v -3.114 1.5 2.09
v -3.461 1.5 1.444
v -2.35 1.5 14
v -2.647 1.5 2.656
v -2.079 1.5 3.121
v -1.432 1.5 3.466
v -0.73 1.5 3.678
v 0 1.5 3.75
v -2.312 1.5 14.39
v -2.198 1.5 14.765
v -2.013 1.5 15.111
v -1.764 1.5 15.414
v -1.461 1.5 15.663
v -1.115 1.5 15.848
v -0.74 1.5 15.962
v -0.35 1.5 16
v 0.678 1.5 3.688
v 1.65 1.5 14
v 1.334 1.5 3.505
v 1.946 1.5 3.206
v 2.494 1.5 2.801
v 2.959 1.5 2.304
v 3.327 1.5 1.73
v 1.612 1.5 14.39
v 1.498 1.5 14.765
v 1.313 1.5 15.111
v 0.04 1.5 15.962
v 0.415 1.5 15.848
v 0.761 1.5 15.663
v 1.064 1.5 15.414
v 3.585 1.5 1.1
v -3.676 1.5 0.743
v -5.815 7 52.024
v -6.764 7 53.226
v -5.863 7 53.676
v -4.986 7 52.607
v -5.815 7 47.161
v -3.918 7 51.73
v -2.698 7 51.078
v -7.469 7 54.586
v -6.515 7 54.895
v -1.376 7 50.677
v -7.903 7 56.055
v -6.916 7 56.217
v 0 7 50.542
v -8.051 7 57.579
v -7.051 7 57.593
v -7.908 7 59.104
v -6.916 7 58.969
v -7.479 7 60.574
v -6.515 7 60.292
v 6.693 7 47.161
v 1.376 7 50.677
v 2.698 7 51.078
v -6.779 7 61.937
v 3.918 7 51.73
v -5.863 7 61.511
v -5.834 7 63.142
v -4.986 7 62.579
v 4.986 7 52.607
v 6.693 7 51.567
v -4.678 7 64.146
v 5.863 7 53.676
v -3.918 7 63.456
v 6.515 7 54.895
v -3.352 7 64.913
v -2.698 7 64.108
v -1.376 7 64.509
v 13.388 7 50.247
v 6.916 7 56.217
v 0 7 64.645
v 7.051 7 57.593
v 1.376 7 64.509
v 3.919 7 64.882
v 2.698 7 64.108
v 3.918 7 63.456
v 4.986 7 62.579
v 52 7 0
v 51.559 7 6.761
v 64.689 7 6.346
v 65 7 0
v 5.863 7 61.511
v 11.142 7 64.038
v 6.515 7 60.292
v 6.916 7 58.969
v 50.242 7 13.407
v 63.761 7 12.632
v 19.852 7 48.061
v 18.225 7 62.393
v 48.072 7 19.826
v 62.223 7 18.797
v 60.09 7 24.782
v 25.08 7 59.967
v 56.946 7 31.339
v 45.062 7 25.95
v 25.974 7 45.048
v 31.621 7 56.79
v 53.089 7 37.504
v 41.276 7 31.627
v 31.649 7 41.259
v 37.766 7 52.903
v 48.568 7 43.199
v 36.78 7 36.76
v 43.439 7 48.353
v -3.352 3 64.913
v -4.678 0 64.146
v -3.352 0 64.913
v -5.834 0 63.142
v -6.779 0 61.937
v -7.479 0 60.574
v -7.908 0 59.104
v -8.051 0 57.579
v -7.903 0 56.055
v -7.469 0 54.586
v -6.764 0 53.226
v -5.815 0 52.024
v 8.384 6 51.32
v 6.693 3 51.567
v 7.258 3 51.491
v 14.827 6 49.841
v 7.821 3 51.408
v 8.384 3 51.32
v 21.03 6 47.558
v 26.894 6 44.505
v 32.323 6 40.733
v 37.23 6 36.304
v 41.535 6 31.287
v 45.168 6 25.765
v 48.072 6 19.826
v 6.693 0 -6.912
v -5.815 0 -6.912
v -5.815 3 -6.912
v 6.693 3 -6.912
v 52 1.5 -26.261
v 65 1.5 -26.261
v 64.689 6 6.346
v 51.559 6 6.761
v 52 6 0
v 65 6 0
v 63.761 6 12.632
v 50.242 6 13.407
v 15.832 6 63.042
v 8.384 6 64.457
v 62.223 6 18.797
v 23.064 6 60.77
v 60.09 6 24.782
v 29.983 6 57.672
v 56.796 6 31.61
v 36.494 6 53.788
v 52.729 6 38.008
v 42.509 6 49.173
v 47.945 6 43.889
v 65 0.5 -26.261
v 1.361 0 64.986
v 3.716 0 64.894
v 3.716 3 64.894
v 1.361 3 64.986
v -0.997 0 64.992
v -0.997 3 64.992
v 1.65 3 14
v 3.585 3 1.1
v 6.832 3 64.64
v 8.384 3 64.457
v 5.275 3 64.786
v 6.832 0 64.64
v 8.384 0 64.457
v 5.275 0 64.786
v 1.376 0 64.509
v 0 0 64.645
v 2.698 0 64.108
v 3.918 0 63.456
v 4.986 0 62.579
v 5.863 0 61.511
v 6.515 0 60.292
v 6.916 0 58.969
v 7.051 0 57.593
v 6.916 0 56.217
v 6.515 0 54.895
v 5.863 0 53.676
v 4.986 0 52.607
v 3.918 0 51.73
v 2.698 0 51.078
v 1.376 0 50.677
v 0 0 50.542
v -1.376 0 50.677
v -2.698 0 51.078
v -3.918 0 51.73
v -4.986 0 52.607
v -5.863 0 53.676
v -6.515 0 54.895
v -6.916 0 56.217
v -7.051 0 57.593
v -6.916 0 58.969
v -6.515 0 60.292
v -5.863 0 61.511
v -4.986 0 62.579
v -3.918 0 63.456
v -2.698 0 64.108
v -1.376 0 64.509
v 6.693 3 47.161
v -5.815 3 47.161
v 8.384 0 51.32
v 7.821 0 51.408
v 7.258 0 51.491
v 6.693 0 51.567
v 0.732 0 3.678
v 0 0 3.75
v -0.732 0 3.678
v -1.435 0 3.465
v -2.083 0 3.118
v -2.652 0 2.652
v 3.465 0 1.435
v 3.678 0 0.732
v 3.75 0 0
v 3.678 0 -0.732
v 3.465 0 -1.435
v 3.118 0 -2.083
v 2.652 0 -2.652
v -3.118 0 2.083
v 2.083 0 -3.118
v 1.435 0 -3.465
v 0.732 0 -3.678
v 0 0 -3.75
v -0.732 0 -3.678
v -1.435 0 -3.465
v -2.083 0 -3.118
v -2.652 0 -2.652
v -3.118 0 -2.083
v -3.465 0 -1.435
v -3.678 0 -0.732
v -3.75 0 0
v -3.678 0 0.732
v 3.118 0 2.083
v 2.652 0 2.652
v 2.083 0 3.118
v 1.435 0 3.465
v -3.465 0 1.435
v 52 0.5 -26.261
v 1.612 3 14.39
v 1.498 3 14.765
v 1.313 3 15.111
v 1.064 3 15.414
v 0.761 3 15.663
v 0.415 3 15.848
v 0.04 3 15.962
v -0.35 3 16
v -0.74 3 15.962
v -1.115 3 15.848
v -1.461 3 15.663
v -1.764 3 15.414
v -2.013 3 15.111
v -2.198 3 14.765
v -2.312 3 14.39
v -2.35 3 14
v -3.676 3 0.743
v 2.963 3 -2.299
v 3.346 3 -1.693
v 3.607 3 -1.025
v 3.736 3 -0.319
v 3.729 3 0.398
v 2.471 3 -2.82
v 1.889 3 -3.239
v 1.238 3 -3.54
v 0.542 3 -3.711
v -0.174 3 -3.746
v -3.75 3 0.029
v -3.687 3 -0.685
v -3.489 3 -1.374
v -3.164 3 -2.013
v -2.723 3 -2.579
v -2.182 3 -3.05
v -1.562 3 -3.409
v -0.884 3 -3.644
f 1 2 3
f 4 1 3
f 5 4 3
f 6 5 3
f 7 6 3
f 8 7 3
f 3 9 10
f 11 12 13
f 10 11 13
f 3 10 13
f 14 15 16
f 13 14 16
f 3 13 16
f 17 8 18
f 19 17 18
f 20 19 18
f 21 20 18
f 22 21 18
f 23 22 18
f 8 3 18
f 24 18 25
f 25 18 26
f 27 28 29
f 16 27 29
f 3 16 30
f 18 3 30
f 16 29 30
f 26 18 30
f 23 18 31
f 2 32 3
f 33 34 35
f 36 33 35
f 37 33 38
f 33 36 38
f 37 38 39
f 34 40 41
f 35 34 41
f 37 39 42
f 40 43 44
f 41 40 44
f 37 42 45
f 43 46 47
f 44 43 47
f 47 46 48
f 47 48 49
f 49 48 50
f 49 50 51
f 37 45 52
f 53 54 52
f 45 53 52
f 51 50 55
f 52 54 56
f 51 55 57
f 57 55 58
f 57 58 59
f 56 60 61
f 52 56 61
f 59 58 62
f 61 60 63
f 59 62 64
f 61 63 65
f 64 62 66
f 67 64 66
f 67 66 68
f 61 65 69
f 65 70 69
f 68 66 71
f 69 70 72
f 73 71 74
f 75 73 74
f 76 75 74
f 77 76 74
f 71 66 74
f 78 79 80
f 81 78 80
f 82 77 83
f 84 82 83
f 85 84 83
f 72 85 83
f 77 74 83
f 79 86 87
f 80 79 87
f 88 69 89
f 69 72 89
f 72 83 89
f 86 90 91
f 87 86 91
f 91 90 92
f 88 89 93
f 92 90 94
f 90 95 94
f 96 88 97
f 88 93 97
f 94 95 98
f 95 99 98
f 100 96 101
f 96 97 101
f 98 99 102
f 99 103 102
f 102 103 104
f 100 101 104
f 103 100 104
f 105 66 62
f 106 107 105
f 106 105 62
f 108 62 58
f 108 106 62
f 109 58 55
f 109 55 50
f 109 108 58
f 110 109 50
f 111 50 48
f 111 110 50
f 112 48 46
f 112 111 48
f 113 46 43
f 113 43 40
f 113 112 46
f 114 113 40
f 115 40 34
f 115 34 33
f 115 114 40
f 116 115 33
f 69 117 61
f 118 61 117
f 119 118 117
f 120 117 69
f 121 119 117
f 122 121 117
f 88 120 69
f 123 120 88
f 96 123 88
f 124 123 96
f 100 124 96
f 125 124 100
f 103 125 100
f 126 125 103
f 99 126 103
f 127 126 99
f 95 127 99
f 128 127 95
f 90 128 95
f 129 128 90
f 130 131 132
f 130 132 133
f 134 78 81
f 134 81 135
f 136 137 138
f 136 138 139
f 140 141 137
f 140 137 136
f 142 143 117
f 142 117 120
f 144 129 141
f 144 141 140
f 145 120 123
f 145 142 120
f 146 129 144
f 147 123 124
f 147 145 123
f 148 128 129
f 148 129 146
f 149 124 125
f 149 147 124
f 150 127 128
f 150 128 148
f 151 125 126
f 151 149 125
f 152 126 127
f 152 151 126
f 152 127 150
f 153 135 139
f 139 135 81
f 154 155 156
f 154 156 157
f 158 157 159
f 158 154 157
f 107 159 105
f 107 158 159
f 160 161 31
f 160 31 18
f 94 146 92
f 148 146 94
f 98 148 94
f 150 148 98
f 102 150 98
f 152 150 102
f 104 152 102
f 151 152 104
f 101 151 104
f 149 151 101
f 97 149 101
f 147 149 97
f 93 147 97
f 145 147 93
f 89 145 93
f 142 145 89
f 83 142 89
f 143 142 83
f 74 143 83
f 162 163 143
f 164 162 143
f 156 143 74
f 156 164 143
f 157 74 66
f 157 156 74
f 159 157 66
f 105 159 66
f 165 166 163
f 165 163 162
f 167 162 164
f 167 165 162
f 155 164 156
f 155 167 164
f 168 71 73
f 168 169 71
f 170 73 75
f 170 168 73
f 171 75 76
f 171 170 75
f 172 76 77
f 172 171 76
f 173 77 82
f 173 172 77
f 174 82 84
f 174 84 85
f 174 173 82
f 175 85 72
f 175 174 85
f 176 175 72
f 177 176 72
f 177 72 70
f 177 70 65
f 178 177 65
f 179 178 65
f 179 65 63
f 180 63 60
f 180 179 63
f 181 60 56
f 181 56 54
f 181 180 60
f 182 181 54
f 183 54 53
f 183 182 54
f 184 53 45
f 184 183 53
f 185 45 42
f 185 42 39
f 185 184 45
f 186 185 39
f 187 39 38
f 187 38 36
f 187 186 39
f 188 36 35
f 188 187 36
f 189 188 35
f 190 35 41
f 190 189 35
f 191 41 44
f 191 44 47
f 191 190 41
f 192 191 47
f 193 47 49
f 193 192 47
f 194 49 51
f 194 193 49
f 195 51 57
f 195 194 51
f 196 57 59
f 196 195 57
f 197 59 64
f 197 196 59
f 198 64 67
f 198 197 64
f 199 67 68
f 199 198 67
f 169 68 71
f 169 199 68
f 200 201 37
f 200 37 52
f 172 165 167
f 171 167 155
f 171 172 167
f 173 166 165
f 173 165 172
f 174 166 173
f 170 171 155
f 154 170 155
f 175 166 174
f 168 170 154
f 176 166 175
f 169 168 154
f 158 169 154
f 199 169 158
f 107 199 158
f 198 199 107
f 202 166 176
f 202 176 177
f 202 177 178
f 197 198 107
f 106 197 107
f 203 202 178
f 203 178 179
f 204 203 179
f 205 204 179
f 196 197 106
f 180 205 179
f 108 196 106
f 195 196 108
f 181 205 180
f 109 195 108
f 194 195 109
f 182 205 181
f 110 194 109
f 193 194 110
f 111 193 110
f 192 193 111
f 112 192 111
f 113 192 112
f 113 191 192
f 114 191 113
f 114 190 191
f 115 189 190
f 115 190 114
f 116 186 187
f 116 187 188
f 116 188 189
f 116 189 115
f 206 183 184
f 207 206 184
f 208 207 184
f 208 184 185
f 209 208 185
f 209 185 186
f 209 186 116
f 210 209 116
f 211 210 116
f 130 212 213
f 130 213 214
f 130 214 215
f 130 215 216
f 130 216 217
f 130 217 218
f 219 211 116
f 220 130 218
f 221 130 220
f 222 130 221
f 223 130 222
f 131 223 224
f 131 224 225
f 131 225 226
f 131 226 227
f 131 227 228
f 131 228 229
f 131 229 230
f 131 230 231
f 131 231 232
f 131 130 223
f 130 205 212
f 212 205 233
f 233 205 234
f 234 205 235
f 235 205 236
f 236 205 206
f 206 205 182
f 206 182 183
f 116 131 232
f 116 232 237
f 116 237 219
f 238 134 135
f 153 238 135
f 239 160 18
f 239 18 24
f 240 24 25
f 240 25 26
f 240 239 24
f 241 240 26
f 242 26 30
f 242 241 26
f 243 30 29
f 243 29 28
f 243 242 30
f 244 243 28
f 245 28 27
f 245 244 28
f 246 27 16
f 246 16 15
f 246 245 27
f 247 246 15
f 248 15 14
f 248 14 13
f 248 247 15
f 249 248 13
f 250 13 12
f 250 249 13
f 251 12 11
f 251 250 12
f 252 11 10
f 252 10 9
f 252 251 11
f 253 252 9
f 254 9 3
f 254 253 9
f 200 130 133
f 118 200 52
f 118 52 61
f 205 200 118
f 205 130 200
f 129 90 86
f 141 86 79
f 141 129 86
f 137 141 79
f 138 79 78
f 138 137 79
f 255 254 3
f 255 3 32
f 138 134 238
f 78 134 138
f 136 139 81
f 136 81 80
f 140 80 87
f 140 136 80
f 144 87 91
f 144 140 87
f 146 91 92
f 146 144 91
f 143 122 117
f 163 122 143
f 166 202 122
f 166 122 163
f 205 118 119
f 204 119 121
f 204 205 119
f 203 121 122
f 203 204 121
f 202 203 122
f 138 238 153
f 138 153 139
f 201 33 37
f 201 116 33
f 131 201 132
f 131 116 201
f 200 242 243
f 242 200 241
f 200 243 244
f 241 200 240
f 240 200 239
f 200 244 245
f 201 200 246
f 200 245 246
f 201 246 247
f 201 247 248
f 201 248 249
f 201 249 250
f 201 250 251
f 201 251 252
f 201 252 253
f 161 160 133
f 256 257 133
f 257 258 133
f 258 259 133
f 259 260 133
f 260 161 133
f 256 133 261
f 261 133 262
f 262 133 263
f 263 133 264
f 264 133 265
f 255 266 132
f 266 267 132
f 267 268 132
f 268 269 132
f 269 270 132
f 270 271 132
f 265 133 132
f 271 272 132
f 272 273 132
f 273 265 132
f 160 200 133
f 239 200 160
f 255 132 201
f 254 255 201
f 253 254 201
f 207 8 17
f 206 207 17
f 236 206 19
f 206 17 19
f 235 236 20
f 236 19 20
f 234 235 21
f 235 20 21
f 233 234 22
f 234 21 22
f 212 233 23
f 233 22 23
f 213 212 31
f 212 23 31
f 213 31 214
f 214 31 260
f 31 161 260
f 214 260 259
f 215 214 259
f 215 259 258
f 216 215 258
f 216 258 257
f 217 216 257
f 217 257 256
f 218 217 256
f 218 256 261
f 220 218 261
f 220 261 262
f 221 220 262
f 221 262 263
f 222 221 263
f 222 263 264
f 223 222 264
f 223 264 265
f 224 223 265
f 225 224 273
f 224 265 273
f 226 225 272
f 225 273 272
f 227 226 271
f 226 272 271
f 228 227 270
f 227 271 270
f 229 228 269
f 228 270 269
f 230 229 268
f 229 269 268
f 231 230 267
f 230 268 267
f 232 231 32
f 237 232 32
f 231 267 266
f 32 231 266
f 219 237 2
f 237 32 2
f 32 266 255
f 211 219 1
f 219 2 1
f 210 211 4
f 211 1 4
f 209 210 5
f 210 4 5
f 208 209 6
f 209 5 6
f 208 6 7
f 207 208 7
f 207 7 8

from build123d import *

# Parameters (mm, degrees)
SKETCH1_R                = 7.051488697
BOSS_EXTRUDE1_DEPTH      = 3
SKETCH2_R                = 7.051488697
BOSS_EXTRUDE2_DEPTH      = 4
SKETCH3_R                = 3.75
CUT_EXTRUDE1_DEPTH       = 93.010868923
CUT_EXTRUDE2_START       = -3
CUT_EXTRUDE2_DEPTH       = 1.5
SKETCH5_W                = 67.326740962
SKETCH5_H                = 77.001413362
CUT_EXTRUDE4_DEPTH       = 6
BOSS_EXTRUDE3_DEPTH      = 10
BOSS_EXTRUDE3_DEPTH_BACK = 1
SKETCH6_W                = 13
SKETCH6_H                = 26.261119779
CUT_EXTRUDE5_DEPTH       = 89.770385235


with BuildPart() as part:
    # Sketch1 → Boss-Extrude1 (new body)
    with BuildSketch(Plane(origin=(0, 0, 0), x_dir=(1, 0, 0), z_dir=(0, 1, 0))):
        with BuildLine():
            Line((6.693069307, -1.487522855), (6.693069307, -51.567458957))
            ThreePointArc((6.693069307, -51.567458957), (22.956358252, -46.658392769), (36.769552622, -36.769552622))
            ThreePointArc((36.769552622, -36.769552622), (43.25852742, -28.856538348), (48.072152744, -19.825945893))
            Line((48.072152744, -19.825945893), (60.09019093, -24.782432367))
            ThreePointArc((60.09019093, -24.782432367), (54.073159275, -36.070672935), (45.961940777, -45.961940777))
            ThreePointArc((45.961940777, -45.961940777), (26.581470301, -59.316316783), (3.715889133, -64.893698985))
            ThreePointArc((3.715889133, -64.893698985), (0.18200985, -64.999745172), (-3.352407903, -64.913491365))
            ThreePointArc((-3.352407903, -64.913491365), (-7.908445684, -59.104066137), (-5.814964059, -52.024218933))
            Line((-5.814964059, -52.024218933), (-5.814964059, -3.088434015))
            Line((-5.814964059, -3.088434015), (-5.814964059, 3.911565985))
            Line((-5.814964059, 3.911565985), (-5.814964059, 6.911565985))
            Line((-5.814964059, 6.911565985), (6.693069307, 6.911565985))
            Line((6.693069307, 6.911565985), (6.693069307, 3.911565985))
            Line((6.693069307, 3.911565985), (6.693069307, -1.487522855))
        make_face()
        with Locations(Location((0, -57.593120372, 0), (0, 0, 270))):
            Circle(SKETCH1_R, mode=Mode.SUBTRACT)
    extrude(amount=BOSS_EXTRUDE1_DEPTH)

    # Sketch2 → Boss-Extrude2 (add)
    with BuildSketch(Plane(origin=(0, 3, 0), x_dir=(1, 0, 0), z_dir=(0, 1, 0))):
        with BuildLine():
            Line((-5.814964059, -47.160734717), (6.693069307, -47.160734717))
            Line((6.693069307, -47.160734717), (6.693069307, -51.567458957))
            ThreePointArc((6.693069307, -51.567458957), (31.649459702, -41.259080219), (48.072152744, -19.825945893))
            ThreePointArc((48.072152744, -19.825945893), (51.008587231, -10.105643407), (52, 0))
            Line((52, 0), (65, 0))
            ThreePointArc((65, 0), (63.760734039, -12.632054258), (60.09019093, -24.782432367))
            ThreePointArc((60.09019093, -24.782432367), (34.747942094, -54.932508774), (-3.352407903, -64.913491365))
            ThreePointArc((-3.352407903, -64.913491365), (-7.908445684, -59.104066137), (-5.814964059, -52.024218933))
            Line((-5.814964059, -52.024218933), (-5.814964059, -47.160734717))
        make_face()
        with Locations(Location((0, -57.593120372, 0), (0, 0, 270))):
            Circle(SKETCH2_R, mode=Mode.SUBTRACT)
    extrude(amount=BOSS_EXTRUDE2_DEPTH)

    # Sketch3 → Cut-Extrude1 (cut, through all)
    with BuildSketch(Plane(origin=(0, 3, 0), x_dir=(1, 0, 0), z_dir=(0, 1, 0))):
        with Locations(Location((0, 0, 0), (0, 0, 270))):
            Circle(SKETCH3_R)
    extrude(amount=-CUT_EXTRUDE1_DEPTH, mode=Mode.SUBTRACT)

    # Sketch4 → Cut-Extrude2 (cut)
    with BuildSketch(Plane.XZ.offset(CUT_EXTRUDE2_START)):
        with BuildLine():
            Line((3.75, 0), (1.65, 14))
            ThreePointArc((1.65, 14), (-0.35, 16), (-2.35, 14))
            Line((-2.35, 14), (-3.75, 0))
            ThreePointArc((-3.75, 0), (0, -3.75), (3.75, 0))
        make_face()
    extrude(amount=CUT_EXTRUDE2_DEPTH, mode=Mode.SUBTRACT)

    # Sketch5 → Cut-Extrude4 (cut)
    with BuildSketch(Plane.XZ):
        with Locations((42.047234811, 32.501031374)):
            Rectangle(SKETCH5_W, SKETCH5_H)
    extrude(amount=-CUT_EXTRUDE4_DEPTH, mode=Mode.SUBTRACT)

    # Sketch6 → Boss-Extrude3 (add, two sides: drawn at the far end of the back side and taken through both)
    with BuildSketch(Plane.XZ.offset(-6).offset(-BOSS_EXTRUDE3_DEPTH_BACK)):
        with Locations((58.5, -13.13055989)):
            Rectangle(SKETCH6_W, SKETCH6_H)
    extrude(amount=BOSS_EXTRUDE3_DEPTH + BOSS_EXTRUDE3_DEPTH_BACK)

    # Sketch7 → Cut-Extrude5 (cut, through all)
    with BuildSketch(Plane.ZY.offset(-52)):
        Polygon((0, 7), (-26.261119779, 1.5), (-26.261119779, 7), align=None)
        Polygon((-26.261119779, 0.5), (0, 6), (0, -4), (-26.261119779, -4), align=None)
    extrude(amount=-CUT_EXTRUDE5_DEPTH, mode=Mode.SUBTRACT)


solid = part.part
